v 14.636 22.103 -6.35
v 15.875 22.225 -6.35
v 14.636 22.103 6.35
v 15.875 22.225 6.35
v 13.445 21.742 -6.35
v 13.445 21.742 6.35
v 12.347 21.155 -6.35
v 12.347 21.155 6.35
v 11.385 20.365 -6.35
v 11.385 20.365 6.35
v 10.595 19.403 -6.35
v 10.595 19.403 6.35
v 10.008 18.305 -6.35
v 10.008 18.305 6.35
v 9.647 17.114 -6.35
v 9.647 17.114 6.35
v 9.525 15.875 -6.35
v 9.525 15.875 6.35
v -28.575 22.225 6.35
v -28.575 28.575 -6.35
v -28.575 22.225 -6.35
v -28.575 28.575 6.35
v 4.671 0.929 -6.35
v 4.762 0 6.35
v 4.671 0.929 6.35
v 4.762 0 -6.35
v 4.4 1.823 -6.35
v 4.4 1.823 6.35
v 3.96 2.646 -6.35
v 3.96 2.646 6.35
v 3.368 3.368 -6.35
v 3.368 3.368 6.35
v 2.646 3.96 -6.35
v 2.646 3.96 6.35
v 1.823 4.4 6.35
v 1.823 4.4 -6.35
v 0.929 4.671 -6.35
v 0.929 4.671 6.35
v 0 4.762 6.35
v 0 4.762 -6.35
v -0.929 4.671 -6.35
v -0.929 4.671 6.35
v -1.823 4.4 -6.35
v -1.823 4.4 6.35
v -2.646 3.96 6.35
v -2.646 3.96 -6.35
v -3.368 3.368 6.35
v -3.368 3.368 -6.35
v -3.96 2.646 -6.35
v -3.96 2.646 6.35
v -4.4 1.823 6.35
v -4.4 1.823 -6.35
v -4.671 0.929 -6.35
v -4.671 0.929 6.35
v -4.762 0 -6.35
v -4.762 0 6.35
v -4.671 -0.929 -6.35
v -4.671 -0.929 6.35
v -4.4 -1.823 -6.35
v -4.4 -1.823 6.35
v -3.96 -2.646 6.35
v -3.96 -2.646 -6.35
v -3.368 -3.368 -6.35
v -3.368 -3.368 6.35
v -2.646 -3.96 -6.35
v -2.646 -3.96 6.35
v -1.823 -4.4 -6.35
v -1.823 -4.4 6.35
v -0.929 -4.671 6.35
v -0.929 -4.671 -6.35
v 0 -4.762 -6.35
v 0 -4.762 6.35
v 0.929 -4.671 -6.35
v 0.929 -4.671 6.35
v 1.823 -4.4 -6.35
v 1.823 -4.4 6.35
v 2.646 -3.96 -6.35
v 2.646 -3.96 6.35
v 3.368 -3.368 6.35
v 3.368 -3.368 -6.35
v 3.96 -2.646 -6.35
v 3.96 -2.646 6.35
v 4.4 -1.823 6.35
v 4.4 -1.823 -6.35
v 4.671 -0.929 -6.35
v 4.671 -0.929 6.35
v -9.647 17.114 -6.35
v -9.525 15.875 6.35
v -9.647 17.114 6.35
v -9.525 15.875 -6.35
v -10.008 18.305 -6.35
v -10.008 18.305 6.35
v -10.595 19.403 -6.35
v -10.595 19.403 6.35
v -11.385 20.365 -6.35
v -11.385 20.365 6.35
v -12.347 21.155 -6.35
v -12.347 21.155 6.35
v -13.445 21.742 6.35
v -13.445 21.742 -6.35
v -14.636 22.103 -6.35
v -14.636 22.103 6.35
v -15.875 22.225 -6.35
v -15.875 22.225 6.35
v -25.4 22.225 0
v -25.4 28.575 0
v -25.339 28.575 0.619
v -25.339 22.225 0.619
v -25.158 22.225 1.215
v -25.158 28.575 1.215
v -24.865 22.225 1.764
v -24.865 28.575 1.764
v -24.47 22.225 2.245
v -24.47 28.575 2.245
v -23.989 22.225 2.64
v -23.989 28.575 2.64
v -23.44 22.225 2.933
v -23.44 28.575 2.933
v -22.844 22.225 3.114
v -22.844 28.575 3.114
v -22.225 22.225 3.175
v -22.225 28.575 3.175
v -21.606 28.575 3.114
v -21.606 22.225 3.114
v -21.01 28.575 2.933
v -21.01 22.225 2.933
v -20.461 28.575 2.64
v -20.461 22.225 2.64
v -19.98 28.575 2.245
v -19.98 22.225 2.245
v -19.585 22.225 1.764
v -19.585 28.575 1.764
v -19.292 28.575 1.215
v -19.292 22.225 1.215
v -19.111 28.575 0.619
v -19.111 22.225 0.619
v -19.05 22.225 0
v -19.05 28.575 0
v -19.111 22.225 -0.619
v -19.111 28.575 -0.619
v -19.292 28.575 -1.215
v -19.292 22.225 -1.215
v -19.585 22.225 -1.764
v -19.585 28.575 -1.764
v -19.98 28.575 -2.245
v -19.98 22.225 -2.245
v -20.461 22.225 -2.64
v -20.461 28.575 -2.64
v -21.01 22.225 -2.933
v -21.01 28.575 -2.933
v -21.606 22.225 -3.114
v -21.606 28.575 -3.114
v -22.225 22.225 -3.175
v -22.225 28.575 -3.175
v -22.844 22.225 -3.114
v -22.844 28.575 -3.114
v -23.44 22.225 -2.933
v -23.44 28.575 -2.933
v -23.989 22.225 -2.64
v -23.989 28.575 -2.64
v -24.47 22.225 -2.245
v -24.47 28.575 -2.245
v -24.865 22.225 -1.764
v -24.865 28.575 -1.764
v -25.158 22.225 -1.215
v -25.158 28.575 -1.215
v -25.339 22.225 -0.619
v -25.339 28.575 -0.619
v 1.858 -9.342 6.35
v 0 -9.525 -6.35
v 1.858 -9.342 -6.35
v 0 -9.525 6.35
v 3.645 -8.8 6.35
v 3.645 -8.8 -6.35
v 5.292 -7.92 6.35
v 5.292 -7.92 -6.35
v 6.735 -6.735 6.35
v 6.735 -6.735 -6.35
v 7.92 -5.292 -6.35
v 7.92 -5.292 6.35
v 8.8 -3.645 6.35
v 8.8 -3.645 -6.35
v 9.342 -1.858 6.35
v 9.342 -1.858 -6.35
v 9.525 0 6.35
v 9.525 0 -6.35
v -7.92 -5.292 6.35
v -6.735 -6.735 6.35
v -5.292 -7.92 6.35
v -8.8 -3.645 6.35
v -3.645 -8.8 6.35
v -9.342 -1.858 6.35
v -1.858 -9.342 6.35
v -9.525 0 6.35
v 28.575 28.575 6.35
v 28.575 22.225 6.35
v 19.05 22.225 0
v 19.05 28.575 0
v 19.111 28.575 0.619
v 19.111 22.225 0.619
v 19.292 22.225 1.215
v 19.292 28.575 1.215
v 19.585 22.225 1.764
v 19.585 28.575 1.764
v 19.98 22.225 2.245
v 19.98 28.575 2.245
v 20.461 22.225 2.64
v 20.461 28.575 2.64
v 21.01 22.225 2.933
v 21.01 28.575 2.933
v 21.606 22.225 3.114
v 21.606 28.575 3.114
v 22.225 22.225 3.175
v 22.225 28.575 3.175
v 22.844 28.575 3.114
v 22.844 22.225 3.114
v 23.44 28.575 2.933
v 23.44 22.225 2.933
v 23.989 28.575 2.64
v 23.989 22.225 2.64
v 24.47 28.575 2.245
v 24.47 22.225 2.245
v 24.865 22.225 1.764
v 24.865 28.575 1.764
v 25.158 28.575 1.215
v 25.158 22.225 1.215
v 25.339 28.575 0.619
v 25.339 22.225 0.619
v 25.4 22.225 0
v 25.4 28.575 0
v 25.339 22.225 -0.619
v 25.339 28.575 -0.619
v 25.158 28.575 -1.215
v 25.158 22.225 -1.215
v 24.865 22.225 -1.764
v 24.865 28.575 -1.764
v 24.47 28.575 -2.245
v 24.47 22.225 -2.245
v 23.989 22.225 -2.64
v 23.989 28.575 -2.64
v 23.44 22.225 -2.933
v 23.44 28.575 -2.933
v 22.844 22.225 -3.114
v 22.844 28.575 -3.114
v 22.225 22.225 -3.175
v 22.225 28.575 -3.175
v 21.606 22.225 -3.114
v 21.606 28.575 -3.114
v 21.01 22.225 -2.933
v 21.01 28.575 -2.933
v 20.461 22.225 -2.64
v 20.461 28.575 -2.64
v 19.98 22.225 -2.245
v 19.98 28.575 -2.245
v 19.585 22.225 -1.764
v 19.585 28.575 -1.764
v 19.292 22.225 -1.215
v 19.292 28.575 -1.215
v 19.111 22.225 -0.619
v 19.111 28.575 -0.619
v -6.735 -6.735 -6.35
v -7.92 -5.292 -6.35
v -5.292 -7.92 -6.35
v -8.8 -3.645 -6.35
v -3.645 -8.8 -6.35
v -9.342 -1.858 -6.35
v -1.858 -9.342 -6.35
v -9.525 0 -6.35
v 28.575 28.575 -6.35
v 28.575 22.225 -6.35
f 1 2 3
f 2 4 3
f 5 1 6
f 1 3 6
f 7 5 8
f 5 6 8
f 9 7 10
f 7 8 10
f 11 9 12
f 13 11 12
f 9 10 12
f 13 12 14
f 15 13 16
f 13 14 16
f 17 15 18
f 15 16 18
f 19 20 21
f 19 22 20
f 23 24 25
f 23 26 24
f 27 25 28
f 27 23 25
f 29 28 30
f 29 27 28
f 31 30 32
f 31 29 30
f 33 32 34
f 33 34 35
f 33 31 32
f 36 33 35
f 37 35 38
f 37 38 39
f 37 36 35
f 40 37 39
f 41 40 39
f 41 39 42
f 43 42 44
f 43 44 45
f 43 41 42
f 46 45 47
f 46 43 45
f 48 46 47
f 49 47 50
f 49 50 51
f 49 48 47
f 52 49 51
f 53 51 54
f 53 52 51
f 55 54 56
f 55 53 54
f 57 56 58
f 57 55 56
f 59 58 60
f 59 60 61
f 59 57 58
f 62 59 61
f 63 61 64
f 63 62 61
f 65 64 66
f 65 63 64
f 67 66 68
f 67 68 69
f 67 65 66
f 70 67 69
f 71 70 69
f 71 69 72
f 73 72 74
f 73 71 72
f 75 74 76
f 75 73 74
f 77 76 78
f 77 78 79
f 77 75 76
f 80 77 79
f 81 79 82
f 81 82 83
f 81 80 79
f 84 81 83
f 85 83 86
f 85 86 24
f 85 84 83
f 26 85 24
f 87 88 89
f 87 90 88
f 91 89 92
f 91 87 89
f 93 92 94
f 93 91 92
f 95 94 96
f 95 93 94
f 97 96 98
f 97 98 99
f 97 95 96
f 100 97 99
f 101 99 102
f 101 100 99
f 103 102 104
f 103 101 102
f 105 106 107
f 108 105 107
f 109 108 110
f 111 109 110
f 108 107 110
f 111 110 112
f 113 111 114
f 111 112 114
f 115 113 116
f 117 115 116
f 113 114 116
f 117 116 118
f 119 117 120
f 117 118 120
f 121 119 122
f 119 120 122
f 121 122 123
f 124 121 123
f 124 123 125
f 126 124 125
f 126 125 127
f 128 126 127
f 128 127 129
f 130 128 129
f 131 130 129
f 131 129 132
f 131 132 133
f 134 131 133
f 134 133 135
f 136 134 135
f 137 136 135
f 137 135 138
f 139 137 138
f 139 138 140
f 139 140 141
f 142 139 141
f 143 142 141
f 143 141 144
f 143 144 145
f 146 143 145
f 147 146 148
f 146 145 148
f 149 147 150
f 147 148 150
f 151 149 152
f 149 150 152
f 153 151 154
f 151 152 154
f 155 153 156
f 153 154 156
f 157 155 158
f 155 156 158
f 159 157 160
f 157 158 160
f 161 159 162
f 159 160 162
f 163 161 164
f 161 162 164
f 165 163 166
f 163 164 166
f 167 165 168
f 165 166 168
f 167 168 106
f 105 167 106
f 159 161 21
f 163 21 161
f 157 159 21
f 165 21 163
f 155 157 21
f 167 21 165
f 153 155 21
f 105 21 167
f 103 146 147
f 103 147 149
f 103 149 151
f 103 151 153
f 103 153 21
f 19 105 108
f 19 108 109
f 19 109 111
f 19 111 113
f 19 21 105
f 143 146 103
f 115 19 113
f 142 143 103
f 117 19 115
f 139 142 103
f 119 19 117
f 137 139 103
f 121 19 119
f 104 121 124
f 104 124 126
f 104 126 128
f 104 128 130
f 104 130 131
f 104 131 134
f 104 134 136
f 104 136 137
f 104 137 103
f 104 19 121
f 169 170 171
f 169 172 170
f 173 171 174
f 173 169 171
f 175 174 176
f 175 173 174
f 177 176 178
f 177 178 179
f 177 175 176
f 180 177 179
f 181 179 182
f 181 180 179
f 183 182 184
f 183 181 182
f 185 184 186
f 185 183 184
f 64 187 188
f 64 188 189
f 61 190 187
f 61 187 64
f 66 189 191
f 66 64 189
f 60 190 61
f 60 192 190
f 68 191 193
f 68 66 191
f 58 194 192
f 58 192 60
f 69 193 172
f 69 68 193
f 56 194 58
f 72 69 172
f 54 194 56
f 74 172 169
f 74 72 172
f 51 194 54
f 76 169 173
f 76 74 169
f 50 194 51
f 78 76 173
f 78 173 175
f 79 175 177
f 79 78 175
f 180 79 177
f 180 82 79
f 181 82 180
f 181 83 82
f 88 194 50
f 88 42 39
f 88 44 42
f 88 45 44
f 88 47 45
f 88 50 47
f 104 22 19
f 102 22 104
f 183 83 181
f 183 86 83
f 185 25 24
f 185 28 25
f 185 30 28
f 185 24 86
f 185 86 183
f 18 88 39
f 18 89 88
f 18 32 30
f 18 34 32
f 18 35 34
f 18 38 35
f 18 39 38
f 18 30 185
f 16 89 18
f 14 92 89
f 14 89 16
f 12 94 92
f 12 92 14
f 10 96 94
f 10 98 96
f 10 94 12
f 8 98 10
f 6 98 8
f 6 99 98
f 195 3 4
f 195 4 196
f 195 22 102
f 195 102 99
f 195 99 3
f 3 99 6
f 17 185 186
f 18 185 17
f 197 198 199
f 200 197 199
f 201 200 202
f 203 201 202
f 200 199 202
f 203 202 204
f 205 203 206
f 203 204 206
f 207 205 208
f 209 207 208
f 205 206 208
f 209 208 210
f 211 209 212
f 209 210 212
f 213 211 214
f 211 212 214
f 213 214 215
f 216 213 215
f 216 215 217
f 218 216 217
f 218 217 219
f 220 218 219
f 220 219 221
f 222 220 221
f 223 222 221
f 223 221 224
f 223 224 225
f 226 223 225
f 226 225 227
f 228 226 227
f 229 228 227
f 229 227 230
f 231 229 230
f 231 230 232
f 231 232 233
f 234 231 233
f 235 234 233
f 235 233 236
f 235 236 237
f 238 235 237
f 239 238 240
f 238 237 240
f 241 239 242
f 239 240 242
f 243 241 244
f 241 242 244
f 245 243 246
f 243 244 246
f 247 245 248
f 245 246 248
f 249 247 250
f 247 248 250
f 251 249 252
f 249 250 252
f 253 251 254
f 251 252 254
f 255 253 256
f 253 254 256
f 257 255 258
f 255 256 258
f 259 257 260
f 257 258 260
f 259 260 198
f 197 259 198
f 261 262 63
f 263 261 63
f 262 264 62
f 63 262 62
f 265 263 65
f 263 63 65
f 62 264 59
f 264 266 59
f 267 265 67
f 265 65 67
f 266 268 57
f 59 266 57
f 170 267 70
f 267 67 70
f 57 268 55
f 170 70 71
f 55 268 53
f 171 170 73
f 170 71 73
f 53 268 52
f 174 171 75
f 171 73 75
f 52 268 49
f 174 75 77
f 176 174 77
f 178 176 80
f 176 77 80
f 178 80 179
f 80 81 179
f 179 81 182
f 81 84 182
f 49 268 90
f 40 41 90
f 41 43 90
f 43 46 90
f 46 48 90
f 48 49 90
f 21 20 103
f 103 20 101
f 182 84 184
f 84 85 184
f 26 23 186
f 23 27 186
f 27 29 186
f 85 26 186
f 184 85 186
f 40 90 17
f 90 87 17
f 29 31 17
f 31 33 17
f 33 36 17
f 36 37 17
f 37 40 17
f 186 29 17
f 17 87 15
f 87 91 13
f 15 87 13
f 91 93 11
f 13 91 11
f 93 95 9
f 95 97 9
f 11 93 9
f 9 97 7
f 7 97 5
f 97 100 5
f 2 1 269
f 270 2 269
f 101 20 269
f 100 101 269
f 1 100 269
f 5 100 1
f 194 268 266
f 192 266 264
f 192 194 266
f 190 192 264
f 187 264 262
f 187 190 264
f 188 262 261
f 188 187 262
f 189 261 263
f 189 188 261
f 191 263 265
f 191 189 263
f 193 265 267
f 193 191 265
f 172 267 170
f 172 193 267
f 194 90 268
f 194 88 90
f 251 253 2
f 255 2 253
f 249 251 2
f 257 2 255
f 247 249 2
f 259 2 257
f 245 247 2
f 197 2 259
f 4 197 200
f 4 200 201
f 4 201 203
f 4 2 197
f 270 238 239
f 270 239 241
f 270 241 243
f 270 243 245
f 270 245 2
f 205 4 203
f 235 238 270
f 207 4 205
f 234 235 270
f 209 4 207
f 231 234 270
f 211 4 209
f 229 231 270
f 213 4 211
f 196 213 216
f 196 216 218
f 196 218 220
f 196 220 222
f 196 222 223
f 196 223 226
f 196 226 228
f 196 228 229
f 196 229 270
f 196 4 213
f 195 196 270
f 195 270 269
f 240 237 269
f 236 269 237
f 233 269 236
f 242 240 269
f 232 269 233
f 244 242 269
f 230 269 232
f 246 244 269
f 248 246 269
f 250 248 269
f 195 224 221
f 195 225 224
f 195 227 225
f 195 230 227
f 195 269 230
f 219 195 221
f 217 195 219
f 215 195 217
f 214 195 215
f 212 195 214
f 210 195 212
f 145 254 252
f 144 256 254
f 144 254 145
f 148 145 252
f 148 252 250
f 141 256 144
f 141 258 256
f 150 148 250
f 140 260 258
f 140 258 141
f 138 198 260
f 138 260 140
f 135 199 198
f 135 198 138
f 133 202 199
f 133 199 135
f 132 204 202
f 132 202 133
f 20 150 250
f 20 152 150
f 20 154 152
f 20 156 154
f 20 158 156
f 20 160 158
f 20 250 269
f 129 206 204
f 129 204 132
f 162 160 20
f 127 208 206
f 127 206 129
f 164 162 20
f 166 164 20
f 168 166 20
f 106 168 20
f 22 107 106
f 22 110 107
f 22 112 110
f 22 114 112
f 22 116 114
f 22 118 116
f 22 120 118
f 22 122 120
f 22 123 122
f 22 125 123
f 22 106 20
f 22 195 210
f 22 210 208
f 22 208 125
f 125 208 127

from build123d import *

# Parameters (mm, degrees)
SKETCH1_R           = 4.7625
BOSS_EXTRUDE1_DEPTH = 6.35
FILLET1_R           = 6.35
FILLET2_R           = 9.525
SKETCH3_R           = 3.175
CUT_EXTRUDE2_DEPTH  = 49.046468393


with BuildPart() as part:
    # Sketch1 → Boss-Extrude1 (new, symmetric)
    with BuildSketch(Plane.XY):
        Polygon((-9.525, 22.225), (-9.525, -9.525), (9.525, -9.525), (9.525, 22.225), (28.575, 22.225), (28.575, 28.575), (-28.575, 28.575), (-28.575, 22.225), align=None)
        Circle(SKETCH1_R, mode=Mode.SUBTRACT)
    extrude(amount=BOSS_EXTRUDE1_DEPTH, both=True)

    # Fillet1
    fillet1_edges = [part.edges().sort_by_distance(p)[0] for p in [
        (9.525, 22.225, 0),
        (-9.525, 22.225, 0),
    ]]
    fillet(fillet1_edges, radius=FILLET1_R)

    # Fillet2
    fillet2_edges = [part.edges().sort_by_distance(p)[0] for p in [
        (9.525, -9.525, 0),
        (-9.525, -9.525, 0),
    ]]
    fillet(fillet2_edges, radius=FILLET2_R - 0.0001)  # a hair under: the kernel refuses the full size

    # Sketch3 → Cut-Extrude2 (cut, through all)
    with BuildSketch(Plane(origin=(0, 28.575, 0), x_dir=(1, 0, 0), z_dir=(0, 1, 0))):
        with Locations(Location((-22.225, 0, 0), (0, 0, 180))):
            Circle(SKETCH3_R)
        with Locations(Location((22.225, 0, 0), (0, 0, 180))):
            Circle(SKETCH3_R)
    extrude(amount=-CUT_EXTRUDE2_DEPTH, mode=Mode.SUBTRACT)


solid = part.part
